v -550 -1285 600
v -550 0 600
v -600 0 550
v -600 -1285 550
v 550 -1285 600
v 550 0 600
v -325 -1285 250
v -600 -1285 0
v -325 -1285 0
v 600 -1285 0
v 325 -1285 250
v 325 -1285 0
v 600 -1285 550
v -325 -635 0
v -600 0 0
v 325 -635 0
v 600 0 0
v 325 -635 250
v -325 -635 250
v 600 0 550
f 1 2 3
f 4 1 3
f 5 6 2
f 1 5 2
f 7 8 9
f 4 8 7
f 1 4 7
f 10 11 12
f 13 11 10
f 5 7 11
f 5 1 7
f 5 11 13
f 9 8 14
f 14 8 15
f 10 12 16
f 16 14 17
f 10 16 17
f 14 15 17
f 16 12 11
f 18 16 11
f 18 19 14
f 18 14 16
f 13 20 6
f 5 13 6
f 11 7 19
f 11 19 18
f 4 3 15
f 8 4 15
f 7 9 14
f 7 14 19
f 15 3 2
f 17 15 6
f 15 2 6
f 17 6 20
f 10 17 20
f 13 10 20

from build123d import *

# Parameters (mm, degrees)
F1_DEPTH = 1285
F2_W     = 650
F2_H     = 250
F3_DEPTH = 650


with BuildPart() as f1:
    # F0 (on Front) → F1 (new body)
    with BuildSketch(Plane.XZ):
        Polygon((-600, 0), (0, 0), (600, 0), (600, 550), (550, 600), (-550, 600), (-600, 550), align=None)
    extrude(amount=F1_DEPTH)

    # F2 (on face) → F3 (cut)
    with BuildSketch(Plane.XZ.offset(1285)):
        with Locations((0, 125)):
            Rectangle(F2_W, F2_H)
    extrude(amount=-F3_DEPTH, mode=Mode.SUBTRACT)


solid = f1.part
